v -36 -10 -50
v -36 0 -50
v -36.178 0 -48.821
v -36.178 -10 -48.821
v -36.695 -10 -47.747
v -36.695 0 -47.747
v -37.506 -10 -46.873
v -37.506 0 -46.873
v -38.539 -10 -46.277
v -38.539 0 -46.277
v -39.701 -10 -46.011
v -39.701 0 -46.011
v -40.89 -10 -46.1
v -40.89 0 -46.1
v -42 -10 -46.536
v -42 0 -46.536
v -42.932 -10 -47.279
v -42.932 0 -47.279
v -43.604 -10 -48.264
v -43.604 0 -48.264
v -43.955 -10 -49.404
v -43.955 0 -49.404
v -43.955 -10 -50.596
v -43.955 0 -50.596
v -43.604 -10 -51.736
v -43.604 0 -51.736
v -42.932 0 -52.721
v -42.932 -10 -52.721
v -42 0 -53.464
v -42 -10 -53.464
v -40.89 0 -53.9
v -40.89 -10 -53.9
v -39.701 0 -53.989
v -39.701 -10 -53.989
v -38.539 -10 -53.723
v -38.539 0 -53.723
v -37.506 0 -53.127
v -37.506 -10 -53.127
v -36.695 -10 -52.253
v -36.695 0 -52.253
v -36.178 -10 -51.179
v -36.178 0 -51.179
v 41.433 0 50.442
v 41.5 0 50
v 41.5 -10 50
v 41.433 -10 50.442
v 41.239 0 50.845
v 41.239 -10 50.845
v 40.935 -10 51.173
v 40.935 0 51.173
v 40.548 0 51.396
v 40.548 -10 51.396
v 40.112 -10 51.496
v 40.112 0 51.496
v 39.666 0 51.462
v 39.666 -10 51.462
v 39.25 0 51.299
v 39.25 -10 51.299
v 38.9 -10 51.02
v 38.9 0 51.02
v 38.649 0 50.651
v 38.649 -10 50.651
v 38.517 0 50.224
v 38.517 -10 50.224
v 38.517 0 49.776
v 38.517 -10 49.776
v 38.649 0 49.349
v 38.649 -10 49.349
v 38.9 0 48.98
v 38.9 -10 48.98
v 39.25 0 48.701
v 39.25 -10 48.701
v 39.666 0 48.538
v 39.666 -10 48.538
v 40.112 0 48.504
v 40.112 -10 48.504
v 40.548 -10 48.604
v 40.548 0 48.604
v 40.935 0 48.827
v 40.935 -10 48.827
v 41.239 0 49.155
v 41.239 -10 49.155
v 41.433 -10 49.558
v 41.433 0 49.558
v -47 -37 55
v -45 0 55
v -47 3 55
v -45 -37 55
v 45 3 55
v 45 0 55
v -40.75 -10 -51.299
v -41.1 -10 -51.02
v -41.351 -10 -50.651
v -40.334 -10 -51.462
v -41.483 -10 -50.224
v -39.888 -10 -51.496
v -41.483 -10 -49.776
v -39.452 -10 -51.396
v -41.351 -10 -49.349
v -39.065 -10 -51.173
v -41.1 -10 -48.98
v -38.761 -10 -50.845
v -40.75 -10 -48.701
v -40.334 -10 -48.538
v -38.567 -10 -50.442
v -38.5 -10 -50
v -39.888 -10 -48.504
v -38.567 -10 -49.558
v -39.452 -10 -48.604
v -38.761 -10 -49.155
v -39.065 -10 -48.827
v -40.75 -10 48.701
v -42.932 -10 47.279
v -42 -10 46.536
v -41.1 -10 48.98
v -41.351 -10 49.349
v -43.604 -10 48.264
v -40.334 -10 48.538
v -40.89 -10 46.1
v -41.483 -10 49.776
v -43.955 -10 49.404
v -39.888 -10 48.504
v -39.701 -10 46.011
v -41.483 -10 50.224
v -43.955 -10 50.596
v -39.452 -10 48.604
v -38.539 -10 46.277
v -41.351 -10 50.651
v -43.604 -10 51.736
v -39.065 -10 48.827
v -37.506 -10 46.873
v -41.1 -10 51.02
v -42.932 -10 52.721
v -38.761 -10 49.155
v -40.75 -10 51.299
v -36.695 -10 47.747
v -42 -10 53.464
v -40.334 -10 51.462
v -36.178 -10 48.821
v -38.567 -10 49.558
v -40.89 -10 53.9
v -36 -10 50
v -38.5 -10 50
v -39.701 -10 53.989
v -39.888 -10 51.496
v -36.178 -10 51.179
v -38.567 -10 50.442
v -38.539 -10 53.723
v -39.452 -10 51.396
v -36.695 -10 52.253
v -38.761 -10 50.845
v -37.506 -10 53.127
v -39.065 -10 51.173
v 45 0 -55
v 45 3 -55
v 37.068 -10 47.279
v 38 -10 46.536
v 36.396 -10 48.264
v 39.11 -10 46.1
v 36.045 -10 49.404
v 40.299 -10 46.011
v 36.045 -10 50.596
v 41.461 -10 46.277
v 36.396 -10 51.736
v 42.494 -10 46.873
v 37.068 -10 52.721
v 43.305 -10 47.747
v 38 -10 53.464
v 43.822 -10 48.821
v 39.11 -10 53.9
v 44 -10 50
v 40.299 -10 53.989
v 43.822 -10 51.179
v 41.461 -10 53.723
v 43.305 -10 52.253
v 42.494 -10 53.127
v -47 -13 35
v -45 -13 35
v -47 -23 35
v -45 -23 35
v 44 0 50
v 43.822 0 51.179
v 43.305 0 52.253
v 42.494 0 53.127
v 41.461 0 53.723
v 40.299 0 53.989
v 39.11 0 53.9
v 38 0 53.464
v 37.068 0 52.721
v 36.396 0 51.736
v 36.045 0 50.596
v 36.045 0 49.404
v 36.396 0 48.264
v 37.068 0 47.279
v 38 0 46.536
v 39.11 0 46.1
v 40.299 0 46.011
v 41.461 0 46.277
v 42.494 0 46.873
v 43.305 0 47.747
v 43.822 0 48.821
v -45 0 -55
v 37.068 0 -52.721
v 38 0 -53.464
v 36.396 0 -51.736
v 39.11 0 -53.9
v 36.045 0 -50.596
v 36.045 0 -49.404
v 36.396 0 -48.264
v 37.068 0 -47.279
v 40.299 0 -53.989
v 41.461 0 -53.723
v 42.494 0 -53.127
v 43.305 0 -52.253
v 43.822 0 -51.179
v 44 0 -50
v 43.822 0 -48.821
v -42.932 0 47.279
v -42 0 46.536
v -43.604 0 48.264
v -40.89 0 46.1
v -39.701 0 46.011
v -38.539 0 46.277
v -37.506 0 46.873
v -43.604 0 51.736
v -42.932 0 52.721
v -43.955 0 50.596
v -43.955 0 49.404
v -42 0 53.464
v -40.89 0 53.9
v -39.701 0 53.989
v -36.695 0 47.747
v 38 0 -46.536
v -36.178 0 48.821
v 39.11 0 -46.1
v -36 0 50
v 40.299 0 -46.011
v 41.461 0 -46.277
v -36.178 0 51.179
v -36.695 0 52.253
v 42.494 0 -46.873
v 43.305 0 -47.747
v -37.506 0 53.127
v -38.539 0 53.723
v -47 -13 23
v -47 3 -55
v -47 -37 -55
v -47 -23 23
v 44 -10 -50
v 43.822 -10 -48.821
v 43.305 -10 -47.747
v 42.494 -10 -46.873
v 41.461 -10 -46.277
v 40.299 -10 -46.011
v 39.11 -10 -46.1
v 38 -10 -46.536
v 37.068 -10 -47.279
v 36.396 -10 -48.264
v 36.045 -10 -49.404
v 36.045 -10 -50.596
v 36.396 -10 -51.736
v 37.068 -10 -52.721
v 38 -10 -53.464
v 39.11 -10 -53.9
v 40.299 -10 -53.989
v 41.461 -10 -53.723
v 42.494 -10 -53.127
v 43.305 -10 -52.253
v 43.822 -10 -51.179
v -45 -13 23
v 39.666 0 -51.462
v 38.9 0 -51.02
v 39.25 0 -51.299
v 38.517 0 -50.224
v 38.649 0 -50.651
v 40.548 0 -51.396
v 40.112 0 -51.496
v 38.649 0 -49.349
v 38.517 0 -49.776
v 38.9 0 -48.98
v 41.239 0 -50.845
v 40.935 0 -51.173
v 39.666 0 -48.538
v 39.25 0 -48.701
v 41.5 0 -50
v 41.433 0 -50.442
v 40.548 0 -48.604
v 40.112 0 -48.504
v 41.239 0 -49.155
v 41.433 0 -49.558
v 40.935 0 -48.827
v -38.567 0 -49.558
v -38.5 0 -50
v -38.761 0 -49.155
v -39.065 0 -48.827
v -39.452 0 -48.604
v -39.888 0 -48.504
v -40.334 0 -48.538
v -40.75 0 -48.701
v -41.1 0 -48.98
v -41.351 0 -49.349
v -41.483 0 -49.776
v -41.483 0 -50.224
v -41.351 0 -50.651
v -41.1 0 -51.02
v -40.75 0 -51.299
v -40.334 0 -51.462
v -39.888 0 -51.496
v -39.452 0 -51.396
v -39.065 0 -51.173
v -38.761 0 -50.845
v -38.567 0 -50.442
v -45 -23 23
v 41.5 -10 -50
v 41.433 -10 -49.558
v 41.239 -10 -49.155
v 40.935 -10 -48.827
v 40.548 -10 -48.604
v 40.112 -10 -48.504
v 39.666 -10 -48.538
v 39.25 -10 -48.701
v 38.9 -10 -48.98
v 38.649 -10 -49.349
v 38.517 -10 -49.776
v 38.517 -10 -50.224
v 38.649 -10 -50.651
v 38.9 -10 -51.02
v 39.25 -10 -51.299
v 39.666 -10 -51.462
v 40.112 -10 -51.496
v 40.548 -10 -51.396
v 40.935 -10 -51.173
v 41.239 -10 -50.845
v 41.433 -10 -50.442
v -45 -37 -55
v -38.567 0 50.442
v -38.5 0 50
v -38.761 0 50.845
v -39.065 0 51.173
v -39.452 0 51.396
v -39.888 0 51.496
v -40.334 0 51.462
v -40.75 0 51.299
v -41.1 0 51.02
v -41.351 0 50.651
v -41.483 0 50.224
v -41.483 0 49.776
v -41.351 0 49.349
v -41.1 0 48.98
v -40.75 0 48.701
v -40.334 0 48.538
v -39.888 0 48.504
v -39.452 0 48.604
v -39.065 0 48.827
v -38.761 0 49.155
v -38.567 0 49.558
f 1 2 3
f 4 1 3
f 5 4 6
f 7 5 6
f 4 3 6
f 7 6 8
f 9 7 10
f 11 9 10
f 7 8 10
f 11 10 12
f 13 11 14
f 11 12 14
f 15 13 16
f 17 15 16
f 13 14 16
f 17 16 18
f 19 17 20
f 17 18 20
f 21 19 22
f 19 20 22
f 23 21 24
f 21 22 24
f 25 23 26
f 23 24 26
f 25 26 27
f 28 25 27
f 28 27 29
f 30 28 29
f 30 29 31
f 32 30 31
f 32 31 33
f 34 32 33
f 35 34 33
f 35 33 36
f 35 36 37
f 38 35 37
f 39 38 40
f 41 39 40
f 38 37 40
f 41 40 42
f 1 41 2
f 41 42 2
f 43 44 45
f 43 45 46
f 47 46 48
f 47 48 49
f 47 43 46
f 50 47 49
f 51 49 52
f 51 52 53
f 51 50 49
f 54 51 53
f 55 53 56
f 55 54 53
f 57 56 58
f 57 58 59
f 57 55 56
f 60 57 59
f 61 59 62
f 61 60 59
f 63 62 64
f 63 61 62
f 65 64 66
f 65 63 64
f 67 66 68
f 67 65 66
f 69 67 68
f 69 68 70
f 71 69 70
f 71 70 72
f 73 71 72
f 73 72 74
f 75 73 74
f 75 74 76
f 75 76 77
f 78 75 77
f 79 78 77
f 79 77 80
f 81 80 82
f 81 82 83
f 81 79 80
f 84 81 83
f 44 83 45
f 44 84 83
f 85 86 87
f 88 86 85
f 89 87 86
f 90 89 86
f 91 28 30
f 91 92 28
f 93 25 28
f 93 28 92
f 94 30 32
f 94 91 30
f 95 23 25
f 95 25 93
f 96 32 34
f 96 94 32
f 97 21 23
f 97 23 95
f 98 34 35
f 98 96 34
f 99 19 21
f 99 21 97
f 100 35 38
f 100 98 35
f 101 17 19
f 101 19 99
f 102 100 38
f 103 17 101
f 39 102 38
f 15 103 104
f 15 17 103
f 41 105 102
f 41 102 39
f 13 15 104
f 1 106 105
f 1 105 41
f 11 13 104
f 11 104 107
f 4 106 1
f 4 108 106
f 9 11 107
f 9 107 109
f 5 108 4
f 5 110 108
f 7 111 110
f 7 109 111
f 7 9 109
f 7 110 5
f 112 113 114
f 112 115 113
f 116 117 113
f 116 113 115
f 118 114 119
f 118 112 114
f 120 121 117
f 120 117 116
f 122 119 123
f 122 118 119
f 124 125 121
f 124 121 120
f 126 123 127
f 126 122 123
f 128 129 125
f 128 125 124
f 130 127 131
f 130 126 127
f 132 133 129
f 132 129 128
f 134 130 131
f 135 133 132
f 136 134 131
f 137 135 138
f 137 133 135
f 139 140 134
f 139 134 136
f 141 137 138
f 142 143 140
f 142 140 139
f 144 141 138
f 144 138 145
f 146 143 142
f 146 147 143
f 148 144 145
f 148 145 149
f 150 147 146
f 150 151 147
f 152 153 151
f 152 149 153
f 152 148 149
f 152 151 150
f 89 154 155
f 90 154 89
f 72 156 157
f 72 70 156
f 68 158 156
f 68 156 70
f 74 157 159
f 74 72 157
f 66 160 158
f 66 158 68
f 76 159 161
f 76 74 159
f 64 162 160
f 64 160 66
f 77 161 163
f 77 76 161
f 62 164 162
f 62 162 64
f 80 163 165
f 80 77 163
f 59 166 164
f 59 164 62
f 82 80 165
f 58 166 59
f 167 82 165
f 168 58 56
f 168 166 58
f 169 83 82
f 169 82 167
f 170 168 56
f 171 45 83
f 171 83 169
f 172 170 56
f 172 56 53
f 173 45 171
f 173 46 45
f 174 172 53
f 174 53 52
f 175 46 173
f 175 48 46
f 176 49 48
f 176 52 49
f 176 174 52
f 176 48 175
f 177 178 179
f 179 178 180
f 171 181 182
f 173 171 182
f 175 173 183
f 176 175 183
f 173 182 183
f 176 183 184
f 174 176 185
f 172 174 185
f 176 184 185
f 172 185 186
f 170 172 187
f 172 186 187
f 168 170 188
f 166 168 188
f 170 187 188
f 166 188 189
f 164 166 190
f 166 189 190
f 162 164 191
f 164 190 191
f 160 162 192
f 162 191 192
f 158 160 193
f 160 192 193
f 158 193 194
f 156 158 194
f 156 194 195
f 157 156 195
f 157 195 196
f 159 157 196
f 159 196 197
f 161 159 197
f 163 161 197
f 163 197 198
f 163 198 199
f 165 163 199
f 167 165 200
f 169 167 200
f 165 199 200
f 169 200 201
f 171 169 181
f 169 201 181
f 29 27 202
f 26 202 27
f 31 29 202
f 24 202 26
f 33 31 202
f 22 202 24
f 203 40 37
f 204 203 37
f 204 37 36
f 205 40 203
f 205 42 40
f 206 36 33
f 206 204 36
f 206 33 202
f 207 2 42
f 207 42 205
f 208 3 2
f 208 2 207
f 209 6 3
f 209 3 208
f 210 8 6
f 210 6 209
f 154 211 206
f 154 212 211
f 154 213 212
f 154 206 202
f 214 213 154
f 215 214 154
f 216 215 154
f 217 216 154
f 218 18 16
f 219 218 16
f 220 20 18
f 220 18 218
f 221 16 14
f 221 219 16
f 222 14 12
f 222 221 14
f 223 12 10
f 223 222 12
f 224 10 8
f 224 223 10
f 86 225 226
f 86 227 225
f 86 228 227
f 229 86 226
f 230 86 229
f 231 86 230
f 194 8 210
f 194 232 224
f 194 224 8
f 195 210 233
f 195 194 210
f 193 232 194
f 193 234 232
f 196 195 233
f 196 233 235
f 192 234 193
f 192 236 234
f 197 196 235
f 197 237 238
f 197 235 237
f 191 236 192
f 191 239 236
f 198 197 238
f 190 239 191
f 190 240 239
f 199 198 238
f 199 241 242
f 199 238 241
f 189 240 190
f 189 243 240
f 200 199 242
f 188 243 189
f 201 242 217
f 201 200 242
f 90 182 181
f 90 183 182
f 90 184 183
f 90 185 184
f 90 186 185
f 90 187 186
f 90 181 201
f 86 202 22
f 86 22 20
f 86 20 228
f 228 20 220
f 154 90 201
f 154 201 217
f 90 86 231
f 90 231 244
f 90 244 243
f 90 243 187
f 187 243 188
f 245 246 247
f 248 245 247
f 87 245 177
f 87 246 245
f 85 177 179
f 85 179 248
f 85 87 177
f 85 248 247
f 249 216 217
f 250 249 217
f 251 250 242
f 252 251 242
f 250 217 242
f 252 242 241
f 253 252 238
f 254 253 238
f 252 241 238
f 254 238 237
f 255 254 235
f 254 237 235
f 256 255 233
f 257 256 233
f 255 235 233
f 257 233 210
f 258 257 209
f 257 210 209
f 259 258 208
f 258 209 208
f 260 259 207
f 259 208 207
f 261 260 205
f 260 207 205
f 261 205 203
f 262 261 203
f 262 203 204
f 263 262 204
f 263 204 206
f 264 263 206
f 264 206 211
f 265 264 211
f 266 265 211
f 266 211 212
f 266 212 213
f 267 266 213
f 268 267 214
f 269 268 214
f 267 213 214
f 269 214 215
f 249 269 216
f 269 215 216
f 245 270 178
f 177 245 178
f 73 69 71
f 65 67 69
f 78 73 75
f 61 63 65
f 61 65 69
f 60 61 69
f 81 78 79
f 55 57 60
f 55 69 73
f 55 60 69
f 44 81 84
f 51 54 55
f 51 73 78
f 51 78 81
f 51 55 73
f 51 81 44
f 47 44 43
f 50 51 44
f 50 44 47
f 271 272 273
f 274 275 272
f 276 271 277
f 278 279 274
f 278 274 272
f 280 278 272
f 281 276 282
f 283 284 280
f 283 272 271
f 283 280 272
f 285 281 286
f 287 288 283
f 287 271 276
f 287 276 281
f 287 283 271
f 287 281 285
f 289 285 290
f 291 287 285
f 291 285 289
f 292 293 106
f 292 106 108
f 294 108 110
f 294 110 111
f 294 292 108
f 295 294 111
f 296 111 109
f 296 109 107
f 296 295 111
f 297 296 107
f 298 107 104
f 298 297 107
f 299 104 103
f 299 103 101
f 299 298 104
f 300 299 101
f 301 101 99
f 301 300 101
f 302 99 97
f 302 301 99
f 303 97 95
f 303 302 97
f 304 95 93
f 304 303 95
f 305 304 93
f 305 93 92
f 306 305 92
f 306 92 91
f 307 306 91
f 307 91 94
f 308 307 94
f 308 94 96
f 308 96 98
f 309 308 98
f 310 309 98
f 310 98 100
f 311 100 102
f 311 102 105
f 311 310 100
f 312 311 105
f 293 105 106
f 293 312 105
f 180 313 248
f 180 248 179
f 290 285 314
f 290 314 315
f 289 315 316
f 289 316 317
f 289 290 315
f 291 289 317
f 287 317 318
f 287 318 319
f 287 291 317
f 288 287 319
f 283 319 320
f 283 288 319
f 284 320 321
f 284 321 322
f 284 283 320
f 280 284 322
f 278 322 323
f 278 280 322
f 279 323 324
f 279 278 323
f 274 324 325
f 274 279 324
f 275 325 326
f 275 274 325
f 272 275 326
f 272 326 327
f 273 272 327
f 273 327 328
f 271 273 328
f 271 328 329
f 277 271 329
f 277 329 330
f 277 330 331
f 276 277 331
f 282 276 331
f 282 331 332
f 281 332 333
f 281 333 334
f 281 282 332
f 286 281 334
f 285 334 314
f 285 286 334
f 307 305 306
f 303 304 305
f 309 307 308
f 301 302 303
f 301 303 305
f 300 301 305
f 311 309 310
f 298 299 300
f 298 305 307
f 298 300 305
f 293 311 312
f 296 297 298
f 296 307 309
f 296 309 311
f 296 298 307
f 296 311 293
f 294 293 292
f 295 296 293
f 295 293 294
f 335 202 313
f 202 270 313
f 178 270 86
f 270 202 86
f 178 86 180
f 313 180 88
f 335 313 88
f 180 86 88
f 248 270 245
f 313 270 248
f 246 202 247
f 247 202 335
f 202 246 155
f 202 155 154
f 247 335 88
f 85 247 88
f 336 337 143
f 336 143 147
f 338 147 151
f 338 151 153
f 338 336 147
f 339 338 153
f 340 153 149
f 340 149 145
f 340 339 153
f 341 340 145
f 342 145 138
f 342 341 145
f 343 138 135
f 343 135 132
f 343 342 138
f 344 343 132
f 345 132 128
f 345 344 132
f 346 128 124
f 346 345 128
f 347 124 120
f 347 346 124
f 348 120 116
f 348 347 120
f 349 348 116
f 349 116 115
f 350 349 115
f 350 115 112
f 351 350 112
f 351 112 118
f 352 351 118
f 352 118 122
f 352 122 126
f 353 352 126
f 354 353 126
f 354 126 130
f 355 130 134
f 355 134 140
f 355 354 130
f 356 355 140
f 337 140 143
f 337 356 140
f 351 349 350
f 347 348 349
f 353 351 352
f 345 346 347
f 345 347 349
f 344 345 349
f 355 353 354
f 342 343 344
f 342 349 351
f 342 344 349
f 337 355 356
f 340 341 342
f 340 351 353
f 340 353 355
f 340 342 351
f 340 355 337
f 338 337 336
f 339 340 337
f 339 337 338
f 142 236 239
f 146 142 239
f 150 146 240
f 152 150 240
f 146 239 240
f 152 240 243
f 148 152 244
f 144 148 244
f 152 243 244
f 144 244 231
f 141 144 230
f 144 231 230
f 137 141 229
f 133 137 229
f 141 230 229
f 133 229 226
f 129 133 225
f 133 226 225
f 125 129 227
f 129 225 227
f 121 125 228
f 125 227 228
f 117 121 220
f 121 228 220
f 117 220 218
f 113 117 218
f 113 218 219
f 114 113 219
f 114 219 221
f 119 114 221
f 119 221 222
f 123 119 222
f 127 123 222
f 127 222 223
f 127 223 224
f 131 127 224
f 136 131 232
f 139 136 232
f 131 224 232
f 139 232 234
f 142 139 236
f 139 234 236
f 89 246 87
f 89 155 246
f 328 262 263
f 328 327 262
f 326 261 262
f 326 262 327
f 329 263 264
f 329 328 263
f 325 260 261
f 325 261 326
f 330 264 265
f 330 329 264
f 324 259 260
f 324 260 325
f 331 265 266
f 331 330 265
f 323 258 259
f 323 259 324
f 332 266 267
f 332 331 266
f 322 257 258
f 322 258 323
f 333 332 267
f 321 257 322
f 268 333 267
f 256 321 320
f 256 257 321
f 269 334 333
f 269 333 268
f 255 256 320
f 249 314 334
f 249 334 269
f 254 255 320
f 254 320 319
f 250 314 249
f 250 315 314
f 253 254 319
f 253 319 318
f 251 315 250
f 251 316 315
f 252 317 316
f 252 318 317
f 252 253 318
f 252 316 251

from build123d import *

# Parameters (mm, degrees)
F0_W     = 90
F0_H     = 110
F1_DEPTH = 3
F2_R     = 4
F2_R_2   = 1.5
F3_DEPTH = 10
F4_W     = 40
F4_H     = 110
F4_W_2   = 10
F4_H_2   = 12
F5_DEPTH = 2


with BuildPart() as f1:
    # F0 (on Front) → F1 (new body)
    with BuildSketch(Plane.XZ):
        Rectangle(F0_W, F0_H)
    extrude(amount=-F1_DEPTH)

    # F2 (on face) → F3 (join)
    with BuildSketch(Plane.XZ):
        with Locations((40, 50)):
            Circle(F2_R)
        with Locations((40, 50)):
            Circle(F2_R_2, mode=Mode.SUBTRACT)
        with Locations((-40, 50)):
            Circle(F2_R)
        with Locations((-40, 50)):
            Circle(F2_R_2, mode=Mode.SUBTRACT)
        with Locations((-40, -50)):
            Circle(F2_R)
        with Locations((-40, -50)):
            Circle(F2_R_2, mode=Mode.SUBTRACT)
        with Locations((40, -50)):
            Circle(F2_R)
        with Locations((40, -50)):
            Circle(F2_R_2, mode=Mode.SUBTRACT)
    extrude(amount=F3_DEPTH)

    # F4 (on face) → F5 (join)
    with BuildSketch(Plane(origin=(-45, 0, 0), x_dir=(0, -1, 0), z_dir=(-1, 0, 0))):
        with Locations((17, 0)):
            Rectangle(F4_W, F4_H)
        with Locations((18, 29)):
            Rectangle(F4_W_2, F4_H_2, mode=Mode.SUBTRACT)
    extrude(amount=F5_DEPTH)


solid = f1.part
